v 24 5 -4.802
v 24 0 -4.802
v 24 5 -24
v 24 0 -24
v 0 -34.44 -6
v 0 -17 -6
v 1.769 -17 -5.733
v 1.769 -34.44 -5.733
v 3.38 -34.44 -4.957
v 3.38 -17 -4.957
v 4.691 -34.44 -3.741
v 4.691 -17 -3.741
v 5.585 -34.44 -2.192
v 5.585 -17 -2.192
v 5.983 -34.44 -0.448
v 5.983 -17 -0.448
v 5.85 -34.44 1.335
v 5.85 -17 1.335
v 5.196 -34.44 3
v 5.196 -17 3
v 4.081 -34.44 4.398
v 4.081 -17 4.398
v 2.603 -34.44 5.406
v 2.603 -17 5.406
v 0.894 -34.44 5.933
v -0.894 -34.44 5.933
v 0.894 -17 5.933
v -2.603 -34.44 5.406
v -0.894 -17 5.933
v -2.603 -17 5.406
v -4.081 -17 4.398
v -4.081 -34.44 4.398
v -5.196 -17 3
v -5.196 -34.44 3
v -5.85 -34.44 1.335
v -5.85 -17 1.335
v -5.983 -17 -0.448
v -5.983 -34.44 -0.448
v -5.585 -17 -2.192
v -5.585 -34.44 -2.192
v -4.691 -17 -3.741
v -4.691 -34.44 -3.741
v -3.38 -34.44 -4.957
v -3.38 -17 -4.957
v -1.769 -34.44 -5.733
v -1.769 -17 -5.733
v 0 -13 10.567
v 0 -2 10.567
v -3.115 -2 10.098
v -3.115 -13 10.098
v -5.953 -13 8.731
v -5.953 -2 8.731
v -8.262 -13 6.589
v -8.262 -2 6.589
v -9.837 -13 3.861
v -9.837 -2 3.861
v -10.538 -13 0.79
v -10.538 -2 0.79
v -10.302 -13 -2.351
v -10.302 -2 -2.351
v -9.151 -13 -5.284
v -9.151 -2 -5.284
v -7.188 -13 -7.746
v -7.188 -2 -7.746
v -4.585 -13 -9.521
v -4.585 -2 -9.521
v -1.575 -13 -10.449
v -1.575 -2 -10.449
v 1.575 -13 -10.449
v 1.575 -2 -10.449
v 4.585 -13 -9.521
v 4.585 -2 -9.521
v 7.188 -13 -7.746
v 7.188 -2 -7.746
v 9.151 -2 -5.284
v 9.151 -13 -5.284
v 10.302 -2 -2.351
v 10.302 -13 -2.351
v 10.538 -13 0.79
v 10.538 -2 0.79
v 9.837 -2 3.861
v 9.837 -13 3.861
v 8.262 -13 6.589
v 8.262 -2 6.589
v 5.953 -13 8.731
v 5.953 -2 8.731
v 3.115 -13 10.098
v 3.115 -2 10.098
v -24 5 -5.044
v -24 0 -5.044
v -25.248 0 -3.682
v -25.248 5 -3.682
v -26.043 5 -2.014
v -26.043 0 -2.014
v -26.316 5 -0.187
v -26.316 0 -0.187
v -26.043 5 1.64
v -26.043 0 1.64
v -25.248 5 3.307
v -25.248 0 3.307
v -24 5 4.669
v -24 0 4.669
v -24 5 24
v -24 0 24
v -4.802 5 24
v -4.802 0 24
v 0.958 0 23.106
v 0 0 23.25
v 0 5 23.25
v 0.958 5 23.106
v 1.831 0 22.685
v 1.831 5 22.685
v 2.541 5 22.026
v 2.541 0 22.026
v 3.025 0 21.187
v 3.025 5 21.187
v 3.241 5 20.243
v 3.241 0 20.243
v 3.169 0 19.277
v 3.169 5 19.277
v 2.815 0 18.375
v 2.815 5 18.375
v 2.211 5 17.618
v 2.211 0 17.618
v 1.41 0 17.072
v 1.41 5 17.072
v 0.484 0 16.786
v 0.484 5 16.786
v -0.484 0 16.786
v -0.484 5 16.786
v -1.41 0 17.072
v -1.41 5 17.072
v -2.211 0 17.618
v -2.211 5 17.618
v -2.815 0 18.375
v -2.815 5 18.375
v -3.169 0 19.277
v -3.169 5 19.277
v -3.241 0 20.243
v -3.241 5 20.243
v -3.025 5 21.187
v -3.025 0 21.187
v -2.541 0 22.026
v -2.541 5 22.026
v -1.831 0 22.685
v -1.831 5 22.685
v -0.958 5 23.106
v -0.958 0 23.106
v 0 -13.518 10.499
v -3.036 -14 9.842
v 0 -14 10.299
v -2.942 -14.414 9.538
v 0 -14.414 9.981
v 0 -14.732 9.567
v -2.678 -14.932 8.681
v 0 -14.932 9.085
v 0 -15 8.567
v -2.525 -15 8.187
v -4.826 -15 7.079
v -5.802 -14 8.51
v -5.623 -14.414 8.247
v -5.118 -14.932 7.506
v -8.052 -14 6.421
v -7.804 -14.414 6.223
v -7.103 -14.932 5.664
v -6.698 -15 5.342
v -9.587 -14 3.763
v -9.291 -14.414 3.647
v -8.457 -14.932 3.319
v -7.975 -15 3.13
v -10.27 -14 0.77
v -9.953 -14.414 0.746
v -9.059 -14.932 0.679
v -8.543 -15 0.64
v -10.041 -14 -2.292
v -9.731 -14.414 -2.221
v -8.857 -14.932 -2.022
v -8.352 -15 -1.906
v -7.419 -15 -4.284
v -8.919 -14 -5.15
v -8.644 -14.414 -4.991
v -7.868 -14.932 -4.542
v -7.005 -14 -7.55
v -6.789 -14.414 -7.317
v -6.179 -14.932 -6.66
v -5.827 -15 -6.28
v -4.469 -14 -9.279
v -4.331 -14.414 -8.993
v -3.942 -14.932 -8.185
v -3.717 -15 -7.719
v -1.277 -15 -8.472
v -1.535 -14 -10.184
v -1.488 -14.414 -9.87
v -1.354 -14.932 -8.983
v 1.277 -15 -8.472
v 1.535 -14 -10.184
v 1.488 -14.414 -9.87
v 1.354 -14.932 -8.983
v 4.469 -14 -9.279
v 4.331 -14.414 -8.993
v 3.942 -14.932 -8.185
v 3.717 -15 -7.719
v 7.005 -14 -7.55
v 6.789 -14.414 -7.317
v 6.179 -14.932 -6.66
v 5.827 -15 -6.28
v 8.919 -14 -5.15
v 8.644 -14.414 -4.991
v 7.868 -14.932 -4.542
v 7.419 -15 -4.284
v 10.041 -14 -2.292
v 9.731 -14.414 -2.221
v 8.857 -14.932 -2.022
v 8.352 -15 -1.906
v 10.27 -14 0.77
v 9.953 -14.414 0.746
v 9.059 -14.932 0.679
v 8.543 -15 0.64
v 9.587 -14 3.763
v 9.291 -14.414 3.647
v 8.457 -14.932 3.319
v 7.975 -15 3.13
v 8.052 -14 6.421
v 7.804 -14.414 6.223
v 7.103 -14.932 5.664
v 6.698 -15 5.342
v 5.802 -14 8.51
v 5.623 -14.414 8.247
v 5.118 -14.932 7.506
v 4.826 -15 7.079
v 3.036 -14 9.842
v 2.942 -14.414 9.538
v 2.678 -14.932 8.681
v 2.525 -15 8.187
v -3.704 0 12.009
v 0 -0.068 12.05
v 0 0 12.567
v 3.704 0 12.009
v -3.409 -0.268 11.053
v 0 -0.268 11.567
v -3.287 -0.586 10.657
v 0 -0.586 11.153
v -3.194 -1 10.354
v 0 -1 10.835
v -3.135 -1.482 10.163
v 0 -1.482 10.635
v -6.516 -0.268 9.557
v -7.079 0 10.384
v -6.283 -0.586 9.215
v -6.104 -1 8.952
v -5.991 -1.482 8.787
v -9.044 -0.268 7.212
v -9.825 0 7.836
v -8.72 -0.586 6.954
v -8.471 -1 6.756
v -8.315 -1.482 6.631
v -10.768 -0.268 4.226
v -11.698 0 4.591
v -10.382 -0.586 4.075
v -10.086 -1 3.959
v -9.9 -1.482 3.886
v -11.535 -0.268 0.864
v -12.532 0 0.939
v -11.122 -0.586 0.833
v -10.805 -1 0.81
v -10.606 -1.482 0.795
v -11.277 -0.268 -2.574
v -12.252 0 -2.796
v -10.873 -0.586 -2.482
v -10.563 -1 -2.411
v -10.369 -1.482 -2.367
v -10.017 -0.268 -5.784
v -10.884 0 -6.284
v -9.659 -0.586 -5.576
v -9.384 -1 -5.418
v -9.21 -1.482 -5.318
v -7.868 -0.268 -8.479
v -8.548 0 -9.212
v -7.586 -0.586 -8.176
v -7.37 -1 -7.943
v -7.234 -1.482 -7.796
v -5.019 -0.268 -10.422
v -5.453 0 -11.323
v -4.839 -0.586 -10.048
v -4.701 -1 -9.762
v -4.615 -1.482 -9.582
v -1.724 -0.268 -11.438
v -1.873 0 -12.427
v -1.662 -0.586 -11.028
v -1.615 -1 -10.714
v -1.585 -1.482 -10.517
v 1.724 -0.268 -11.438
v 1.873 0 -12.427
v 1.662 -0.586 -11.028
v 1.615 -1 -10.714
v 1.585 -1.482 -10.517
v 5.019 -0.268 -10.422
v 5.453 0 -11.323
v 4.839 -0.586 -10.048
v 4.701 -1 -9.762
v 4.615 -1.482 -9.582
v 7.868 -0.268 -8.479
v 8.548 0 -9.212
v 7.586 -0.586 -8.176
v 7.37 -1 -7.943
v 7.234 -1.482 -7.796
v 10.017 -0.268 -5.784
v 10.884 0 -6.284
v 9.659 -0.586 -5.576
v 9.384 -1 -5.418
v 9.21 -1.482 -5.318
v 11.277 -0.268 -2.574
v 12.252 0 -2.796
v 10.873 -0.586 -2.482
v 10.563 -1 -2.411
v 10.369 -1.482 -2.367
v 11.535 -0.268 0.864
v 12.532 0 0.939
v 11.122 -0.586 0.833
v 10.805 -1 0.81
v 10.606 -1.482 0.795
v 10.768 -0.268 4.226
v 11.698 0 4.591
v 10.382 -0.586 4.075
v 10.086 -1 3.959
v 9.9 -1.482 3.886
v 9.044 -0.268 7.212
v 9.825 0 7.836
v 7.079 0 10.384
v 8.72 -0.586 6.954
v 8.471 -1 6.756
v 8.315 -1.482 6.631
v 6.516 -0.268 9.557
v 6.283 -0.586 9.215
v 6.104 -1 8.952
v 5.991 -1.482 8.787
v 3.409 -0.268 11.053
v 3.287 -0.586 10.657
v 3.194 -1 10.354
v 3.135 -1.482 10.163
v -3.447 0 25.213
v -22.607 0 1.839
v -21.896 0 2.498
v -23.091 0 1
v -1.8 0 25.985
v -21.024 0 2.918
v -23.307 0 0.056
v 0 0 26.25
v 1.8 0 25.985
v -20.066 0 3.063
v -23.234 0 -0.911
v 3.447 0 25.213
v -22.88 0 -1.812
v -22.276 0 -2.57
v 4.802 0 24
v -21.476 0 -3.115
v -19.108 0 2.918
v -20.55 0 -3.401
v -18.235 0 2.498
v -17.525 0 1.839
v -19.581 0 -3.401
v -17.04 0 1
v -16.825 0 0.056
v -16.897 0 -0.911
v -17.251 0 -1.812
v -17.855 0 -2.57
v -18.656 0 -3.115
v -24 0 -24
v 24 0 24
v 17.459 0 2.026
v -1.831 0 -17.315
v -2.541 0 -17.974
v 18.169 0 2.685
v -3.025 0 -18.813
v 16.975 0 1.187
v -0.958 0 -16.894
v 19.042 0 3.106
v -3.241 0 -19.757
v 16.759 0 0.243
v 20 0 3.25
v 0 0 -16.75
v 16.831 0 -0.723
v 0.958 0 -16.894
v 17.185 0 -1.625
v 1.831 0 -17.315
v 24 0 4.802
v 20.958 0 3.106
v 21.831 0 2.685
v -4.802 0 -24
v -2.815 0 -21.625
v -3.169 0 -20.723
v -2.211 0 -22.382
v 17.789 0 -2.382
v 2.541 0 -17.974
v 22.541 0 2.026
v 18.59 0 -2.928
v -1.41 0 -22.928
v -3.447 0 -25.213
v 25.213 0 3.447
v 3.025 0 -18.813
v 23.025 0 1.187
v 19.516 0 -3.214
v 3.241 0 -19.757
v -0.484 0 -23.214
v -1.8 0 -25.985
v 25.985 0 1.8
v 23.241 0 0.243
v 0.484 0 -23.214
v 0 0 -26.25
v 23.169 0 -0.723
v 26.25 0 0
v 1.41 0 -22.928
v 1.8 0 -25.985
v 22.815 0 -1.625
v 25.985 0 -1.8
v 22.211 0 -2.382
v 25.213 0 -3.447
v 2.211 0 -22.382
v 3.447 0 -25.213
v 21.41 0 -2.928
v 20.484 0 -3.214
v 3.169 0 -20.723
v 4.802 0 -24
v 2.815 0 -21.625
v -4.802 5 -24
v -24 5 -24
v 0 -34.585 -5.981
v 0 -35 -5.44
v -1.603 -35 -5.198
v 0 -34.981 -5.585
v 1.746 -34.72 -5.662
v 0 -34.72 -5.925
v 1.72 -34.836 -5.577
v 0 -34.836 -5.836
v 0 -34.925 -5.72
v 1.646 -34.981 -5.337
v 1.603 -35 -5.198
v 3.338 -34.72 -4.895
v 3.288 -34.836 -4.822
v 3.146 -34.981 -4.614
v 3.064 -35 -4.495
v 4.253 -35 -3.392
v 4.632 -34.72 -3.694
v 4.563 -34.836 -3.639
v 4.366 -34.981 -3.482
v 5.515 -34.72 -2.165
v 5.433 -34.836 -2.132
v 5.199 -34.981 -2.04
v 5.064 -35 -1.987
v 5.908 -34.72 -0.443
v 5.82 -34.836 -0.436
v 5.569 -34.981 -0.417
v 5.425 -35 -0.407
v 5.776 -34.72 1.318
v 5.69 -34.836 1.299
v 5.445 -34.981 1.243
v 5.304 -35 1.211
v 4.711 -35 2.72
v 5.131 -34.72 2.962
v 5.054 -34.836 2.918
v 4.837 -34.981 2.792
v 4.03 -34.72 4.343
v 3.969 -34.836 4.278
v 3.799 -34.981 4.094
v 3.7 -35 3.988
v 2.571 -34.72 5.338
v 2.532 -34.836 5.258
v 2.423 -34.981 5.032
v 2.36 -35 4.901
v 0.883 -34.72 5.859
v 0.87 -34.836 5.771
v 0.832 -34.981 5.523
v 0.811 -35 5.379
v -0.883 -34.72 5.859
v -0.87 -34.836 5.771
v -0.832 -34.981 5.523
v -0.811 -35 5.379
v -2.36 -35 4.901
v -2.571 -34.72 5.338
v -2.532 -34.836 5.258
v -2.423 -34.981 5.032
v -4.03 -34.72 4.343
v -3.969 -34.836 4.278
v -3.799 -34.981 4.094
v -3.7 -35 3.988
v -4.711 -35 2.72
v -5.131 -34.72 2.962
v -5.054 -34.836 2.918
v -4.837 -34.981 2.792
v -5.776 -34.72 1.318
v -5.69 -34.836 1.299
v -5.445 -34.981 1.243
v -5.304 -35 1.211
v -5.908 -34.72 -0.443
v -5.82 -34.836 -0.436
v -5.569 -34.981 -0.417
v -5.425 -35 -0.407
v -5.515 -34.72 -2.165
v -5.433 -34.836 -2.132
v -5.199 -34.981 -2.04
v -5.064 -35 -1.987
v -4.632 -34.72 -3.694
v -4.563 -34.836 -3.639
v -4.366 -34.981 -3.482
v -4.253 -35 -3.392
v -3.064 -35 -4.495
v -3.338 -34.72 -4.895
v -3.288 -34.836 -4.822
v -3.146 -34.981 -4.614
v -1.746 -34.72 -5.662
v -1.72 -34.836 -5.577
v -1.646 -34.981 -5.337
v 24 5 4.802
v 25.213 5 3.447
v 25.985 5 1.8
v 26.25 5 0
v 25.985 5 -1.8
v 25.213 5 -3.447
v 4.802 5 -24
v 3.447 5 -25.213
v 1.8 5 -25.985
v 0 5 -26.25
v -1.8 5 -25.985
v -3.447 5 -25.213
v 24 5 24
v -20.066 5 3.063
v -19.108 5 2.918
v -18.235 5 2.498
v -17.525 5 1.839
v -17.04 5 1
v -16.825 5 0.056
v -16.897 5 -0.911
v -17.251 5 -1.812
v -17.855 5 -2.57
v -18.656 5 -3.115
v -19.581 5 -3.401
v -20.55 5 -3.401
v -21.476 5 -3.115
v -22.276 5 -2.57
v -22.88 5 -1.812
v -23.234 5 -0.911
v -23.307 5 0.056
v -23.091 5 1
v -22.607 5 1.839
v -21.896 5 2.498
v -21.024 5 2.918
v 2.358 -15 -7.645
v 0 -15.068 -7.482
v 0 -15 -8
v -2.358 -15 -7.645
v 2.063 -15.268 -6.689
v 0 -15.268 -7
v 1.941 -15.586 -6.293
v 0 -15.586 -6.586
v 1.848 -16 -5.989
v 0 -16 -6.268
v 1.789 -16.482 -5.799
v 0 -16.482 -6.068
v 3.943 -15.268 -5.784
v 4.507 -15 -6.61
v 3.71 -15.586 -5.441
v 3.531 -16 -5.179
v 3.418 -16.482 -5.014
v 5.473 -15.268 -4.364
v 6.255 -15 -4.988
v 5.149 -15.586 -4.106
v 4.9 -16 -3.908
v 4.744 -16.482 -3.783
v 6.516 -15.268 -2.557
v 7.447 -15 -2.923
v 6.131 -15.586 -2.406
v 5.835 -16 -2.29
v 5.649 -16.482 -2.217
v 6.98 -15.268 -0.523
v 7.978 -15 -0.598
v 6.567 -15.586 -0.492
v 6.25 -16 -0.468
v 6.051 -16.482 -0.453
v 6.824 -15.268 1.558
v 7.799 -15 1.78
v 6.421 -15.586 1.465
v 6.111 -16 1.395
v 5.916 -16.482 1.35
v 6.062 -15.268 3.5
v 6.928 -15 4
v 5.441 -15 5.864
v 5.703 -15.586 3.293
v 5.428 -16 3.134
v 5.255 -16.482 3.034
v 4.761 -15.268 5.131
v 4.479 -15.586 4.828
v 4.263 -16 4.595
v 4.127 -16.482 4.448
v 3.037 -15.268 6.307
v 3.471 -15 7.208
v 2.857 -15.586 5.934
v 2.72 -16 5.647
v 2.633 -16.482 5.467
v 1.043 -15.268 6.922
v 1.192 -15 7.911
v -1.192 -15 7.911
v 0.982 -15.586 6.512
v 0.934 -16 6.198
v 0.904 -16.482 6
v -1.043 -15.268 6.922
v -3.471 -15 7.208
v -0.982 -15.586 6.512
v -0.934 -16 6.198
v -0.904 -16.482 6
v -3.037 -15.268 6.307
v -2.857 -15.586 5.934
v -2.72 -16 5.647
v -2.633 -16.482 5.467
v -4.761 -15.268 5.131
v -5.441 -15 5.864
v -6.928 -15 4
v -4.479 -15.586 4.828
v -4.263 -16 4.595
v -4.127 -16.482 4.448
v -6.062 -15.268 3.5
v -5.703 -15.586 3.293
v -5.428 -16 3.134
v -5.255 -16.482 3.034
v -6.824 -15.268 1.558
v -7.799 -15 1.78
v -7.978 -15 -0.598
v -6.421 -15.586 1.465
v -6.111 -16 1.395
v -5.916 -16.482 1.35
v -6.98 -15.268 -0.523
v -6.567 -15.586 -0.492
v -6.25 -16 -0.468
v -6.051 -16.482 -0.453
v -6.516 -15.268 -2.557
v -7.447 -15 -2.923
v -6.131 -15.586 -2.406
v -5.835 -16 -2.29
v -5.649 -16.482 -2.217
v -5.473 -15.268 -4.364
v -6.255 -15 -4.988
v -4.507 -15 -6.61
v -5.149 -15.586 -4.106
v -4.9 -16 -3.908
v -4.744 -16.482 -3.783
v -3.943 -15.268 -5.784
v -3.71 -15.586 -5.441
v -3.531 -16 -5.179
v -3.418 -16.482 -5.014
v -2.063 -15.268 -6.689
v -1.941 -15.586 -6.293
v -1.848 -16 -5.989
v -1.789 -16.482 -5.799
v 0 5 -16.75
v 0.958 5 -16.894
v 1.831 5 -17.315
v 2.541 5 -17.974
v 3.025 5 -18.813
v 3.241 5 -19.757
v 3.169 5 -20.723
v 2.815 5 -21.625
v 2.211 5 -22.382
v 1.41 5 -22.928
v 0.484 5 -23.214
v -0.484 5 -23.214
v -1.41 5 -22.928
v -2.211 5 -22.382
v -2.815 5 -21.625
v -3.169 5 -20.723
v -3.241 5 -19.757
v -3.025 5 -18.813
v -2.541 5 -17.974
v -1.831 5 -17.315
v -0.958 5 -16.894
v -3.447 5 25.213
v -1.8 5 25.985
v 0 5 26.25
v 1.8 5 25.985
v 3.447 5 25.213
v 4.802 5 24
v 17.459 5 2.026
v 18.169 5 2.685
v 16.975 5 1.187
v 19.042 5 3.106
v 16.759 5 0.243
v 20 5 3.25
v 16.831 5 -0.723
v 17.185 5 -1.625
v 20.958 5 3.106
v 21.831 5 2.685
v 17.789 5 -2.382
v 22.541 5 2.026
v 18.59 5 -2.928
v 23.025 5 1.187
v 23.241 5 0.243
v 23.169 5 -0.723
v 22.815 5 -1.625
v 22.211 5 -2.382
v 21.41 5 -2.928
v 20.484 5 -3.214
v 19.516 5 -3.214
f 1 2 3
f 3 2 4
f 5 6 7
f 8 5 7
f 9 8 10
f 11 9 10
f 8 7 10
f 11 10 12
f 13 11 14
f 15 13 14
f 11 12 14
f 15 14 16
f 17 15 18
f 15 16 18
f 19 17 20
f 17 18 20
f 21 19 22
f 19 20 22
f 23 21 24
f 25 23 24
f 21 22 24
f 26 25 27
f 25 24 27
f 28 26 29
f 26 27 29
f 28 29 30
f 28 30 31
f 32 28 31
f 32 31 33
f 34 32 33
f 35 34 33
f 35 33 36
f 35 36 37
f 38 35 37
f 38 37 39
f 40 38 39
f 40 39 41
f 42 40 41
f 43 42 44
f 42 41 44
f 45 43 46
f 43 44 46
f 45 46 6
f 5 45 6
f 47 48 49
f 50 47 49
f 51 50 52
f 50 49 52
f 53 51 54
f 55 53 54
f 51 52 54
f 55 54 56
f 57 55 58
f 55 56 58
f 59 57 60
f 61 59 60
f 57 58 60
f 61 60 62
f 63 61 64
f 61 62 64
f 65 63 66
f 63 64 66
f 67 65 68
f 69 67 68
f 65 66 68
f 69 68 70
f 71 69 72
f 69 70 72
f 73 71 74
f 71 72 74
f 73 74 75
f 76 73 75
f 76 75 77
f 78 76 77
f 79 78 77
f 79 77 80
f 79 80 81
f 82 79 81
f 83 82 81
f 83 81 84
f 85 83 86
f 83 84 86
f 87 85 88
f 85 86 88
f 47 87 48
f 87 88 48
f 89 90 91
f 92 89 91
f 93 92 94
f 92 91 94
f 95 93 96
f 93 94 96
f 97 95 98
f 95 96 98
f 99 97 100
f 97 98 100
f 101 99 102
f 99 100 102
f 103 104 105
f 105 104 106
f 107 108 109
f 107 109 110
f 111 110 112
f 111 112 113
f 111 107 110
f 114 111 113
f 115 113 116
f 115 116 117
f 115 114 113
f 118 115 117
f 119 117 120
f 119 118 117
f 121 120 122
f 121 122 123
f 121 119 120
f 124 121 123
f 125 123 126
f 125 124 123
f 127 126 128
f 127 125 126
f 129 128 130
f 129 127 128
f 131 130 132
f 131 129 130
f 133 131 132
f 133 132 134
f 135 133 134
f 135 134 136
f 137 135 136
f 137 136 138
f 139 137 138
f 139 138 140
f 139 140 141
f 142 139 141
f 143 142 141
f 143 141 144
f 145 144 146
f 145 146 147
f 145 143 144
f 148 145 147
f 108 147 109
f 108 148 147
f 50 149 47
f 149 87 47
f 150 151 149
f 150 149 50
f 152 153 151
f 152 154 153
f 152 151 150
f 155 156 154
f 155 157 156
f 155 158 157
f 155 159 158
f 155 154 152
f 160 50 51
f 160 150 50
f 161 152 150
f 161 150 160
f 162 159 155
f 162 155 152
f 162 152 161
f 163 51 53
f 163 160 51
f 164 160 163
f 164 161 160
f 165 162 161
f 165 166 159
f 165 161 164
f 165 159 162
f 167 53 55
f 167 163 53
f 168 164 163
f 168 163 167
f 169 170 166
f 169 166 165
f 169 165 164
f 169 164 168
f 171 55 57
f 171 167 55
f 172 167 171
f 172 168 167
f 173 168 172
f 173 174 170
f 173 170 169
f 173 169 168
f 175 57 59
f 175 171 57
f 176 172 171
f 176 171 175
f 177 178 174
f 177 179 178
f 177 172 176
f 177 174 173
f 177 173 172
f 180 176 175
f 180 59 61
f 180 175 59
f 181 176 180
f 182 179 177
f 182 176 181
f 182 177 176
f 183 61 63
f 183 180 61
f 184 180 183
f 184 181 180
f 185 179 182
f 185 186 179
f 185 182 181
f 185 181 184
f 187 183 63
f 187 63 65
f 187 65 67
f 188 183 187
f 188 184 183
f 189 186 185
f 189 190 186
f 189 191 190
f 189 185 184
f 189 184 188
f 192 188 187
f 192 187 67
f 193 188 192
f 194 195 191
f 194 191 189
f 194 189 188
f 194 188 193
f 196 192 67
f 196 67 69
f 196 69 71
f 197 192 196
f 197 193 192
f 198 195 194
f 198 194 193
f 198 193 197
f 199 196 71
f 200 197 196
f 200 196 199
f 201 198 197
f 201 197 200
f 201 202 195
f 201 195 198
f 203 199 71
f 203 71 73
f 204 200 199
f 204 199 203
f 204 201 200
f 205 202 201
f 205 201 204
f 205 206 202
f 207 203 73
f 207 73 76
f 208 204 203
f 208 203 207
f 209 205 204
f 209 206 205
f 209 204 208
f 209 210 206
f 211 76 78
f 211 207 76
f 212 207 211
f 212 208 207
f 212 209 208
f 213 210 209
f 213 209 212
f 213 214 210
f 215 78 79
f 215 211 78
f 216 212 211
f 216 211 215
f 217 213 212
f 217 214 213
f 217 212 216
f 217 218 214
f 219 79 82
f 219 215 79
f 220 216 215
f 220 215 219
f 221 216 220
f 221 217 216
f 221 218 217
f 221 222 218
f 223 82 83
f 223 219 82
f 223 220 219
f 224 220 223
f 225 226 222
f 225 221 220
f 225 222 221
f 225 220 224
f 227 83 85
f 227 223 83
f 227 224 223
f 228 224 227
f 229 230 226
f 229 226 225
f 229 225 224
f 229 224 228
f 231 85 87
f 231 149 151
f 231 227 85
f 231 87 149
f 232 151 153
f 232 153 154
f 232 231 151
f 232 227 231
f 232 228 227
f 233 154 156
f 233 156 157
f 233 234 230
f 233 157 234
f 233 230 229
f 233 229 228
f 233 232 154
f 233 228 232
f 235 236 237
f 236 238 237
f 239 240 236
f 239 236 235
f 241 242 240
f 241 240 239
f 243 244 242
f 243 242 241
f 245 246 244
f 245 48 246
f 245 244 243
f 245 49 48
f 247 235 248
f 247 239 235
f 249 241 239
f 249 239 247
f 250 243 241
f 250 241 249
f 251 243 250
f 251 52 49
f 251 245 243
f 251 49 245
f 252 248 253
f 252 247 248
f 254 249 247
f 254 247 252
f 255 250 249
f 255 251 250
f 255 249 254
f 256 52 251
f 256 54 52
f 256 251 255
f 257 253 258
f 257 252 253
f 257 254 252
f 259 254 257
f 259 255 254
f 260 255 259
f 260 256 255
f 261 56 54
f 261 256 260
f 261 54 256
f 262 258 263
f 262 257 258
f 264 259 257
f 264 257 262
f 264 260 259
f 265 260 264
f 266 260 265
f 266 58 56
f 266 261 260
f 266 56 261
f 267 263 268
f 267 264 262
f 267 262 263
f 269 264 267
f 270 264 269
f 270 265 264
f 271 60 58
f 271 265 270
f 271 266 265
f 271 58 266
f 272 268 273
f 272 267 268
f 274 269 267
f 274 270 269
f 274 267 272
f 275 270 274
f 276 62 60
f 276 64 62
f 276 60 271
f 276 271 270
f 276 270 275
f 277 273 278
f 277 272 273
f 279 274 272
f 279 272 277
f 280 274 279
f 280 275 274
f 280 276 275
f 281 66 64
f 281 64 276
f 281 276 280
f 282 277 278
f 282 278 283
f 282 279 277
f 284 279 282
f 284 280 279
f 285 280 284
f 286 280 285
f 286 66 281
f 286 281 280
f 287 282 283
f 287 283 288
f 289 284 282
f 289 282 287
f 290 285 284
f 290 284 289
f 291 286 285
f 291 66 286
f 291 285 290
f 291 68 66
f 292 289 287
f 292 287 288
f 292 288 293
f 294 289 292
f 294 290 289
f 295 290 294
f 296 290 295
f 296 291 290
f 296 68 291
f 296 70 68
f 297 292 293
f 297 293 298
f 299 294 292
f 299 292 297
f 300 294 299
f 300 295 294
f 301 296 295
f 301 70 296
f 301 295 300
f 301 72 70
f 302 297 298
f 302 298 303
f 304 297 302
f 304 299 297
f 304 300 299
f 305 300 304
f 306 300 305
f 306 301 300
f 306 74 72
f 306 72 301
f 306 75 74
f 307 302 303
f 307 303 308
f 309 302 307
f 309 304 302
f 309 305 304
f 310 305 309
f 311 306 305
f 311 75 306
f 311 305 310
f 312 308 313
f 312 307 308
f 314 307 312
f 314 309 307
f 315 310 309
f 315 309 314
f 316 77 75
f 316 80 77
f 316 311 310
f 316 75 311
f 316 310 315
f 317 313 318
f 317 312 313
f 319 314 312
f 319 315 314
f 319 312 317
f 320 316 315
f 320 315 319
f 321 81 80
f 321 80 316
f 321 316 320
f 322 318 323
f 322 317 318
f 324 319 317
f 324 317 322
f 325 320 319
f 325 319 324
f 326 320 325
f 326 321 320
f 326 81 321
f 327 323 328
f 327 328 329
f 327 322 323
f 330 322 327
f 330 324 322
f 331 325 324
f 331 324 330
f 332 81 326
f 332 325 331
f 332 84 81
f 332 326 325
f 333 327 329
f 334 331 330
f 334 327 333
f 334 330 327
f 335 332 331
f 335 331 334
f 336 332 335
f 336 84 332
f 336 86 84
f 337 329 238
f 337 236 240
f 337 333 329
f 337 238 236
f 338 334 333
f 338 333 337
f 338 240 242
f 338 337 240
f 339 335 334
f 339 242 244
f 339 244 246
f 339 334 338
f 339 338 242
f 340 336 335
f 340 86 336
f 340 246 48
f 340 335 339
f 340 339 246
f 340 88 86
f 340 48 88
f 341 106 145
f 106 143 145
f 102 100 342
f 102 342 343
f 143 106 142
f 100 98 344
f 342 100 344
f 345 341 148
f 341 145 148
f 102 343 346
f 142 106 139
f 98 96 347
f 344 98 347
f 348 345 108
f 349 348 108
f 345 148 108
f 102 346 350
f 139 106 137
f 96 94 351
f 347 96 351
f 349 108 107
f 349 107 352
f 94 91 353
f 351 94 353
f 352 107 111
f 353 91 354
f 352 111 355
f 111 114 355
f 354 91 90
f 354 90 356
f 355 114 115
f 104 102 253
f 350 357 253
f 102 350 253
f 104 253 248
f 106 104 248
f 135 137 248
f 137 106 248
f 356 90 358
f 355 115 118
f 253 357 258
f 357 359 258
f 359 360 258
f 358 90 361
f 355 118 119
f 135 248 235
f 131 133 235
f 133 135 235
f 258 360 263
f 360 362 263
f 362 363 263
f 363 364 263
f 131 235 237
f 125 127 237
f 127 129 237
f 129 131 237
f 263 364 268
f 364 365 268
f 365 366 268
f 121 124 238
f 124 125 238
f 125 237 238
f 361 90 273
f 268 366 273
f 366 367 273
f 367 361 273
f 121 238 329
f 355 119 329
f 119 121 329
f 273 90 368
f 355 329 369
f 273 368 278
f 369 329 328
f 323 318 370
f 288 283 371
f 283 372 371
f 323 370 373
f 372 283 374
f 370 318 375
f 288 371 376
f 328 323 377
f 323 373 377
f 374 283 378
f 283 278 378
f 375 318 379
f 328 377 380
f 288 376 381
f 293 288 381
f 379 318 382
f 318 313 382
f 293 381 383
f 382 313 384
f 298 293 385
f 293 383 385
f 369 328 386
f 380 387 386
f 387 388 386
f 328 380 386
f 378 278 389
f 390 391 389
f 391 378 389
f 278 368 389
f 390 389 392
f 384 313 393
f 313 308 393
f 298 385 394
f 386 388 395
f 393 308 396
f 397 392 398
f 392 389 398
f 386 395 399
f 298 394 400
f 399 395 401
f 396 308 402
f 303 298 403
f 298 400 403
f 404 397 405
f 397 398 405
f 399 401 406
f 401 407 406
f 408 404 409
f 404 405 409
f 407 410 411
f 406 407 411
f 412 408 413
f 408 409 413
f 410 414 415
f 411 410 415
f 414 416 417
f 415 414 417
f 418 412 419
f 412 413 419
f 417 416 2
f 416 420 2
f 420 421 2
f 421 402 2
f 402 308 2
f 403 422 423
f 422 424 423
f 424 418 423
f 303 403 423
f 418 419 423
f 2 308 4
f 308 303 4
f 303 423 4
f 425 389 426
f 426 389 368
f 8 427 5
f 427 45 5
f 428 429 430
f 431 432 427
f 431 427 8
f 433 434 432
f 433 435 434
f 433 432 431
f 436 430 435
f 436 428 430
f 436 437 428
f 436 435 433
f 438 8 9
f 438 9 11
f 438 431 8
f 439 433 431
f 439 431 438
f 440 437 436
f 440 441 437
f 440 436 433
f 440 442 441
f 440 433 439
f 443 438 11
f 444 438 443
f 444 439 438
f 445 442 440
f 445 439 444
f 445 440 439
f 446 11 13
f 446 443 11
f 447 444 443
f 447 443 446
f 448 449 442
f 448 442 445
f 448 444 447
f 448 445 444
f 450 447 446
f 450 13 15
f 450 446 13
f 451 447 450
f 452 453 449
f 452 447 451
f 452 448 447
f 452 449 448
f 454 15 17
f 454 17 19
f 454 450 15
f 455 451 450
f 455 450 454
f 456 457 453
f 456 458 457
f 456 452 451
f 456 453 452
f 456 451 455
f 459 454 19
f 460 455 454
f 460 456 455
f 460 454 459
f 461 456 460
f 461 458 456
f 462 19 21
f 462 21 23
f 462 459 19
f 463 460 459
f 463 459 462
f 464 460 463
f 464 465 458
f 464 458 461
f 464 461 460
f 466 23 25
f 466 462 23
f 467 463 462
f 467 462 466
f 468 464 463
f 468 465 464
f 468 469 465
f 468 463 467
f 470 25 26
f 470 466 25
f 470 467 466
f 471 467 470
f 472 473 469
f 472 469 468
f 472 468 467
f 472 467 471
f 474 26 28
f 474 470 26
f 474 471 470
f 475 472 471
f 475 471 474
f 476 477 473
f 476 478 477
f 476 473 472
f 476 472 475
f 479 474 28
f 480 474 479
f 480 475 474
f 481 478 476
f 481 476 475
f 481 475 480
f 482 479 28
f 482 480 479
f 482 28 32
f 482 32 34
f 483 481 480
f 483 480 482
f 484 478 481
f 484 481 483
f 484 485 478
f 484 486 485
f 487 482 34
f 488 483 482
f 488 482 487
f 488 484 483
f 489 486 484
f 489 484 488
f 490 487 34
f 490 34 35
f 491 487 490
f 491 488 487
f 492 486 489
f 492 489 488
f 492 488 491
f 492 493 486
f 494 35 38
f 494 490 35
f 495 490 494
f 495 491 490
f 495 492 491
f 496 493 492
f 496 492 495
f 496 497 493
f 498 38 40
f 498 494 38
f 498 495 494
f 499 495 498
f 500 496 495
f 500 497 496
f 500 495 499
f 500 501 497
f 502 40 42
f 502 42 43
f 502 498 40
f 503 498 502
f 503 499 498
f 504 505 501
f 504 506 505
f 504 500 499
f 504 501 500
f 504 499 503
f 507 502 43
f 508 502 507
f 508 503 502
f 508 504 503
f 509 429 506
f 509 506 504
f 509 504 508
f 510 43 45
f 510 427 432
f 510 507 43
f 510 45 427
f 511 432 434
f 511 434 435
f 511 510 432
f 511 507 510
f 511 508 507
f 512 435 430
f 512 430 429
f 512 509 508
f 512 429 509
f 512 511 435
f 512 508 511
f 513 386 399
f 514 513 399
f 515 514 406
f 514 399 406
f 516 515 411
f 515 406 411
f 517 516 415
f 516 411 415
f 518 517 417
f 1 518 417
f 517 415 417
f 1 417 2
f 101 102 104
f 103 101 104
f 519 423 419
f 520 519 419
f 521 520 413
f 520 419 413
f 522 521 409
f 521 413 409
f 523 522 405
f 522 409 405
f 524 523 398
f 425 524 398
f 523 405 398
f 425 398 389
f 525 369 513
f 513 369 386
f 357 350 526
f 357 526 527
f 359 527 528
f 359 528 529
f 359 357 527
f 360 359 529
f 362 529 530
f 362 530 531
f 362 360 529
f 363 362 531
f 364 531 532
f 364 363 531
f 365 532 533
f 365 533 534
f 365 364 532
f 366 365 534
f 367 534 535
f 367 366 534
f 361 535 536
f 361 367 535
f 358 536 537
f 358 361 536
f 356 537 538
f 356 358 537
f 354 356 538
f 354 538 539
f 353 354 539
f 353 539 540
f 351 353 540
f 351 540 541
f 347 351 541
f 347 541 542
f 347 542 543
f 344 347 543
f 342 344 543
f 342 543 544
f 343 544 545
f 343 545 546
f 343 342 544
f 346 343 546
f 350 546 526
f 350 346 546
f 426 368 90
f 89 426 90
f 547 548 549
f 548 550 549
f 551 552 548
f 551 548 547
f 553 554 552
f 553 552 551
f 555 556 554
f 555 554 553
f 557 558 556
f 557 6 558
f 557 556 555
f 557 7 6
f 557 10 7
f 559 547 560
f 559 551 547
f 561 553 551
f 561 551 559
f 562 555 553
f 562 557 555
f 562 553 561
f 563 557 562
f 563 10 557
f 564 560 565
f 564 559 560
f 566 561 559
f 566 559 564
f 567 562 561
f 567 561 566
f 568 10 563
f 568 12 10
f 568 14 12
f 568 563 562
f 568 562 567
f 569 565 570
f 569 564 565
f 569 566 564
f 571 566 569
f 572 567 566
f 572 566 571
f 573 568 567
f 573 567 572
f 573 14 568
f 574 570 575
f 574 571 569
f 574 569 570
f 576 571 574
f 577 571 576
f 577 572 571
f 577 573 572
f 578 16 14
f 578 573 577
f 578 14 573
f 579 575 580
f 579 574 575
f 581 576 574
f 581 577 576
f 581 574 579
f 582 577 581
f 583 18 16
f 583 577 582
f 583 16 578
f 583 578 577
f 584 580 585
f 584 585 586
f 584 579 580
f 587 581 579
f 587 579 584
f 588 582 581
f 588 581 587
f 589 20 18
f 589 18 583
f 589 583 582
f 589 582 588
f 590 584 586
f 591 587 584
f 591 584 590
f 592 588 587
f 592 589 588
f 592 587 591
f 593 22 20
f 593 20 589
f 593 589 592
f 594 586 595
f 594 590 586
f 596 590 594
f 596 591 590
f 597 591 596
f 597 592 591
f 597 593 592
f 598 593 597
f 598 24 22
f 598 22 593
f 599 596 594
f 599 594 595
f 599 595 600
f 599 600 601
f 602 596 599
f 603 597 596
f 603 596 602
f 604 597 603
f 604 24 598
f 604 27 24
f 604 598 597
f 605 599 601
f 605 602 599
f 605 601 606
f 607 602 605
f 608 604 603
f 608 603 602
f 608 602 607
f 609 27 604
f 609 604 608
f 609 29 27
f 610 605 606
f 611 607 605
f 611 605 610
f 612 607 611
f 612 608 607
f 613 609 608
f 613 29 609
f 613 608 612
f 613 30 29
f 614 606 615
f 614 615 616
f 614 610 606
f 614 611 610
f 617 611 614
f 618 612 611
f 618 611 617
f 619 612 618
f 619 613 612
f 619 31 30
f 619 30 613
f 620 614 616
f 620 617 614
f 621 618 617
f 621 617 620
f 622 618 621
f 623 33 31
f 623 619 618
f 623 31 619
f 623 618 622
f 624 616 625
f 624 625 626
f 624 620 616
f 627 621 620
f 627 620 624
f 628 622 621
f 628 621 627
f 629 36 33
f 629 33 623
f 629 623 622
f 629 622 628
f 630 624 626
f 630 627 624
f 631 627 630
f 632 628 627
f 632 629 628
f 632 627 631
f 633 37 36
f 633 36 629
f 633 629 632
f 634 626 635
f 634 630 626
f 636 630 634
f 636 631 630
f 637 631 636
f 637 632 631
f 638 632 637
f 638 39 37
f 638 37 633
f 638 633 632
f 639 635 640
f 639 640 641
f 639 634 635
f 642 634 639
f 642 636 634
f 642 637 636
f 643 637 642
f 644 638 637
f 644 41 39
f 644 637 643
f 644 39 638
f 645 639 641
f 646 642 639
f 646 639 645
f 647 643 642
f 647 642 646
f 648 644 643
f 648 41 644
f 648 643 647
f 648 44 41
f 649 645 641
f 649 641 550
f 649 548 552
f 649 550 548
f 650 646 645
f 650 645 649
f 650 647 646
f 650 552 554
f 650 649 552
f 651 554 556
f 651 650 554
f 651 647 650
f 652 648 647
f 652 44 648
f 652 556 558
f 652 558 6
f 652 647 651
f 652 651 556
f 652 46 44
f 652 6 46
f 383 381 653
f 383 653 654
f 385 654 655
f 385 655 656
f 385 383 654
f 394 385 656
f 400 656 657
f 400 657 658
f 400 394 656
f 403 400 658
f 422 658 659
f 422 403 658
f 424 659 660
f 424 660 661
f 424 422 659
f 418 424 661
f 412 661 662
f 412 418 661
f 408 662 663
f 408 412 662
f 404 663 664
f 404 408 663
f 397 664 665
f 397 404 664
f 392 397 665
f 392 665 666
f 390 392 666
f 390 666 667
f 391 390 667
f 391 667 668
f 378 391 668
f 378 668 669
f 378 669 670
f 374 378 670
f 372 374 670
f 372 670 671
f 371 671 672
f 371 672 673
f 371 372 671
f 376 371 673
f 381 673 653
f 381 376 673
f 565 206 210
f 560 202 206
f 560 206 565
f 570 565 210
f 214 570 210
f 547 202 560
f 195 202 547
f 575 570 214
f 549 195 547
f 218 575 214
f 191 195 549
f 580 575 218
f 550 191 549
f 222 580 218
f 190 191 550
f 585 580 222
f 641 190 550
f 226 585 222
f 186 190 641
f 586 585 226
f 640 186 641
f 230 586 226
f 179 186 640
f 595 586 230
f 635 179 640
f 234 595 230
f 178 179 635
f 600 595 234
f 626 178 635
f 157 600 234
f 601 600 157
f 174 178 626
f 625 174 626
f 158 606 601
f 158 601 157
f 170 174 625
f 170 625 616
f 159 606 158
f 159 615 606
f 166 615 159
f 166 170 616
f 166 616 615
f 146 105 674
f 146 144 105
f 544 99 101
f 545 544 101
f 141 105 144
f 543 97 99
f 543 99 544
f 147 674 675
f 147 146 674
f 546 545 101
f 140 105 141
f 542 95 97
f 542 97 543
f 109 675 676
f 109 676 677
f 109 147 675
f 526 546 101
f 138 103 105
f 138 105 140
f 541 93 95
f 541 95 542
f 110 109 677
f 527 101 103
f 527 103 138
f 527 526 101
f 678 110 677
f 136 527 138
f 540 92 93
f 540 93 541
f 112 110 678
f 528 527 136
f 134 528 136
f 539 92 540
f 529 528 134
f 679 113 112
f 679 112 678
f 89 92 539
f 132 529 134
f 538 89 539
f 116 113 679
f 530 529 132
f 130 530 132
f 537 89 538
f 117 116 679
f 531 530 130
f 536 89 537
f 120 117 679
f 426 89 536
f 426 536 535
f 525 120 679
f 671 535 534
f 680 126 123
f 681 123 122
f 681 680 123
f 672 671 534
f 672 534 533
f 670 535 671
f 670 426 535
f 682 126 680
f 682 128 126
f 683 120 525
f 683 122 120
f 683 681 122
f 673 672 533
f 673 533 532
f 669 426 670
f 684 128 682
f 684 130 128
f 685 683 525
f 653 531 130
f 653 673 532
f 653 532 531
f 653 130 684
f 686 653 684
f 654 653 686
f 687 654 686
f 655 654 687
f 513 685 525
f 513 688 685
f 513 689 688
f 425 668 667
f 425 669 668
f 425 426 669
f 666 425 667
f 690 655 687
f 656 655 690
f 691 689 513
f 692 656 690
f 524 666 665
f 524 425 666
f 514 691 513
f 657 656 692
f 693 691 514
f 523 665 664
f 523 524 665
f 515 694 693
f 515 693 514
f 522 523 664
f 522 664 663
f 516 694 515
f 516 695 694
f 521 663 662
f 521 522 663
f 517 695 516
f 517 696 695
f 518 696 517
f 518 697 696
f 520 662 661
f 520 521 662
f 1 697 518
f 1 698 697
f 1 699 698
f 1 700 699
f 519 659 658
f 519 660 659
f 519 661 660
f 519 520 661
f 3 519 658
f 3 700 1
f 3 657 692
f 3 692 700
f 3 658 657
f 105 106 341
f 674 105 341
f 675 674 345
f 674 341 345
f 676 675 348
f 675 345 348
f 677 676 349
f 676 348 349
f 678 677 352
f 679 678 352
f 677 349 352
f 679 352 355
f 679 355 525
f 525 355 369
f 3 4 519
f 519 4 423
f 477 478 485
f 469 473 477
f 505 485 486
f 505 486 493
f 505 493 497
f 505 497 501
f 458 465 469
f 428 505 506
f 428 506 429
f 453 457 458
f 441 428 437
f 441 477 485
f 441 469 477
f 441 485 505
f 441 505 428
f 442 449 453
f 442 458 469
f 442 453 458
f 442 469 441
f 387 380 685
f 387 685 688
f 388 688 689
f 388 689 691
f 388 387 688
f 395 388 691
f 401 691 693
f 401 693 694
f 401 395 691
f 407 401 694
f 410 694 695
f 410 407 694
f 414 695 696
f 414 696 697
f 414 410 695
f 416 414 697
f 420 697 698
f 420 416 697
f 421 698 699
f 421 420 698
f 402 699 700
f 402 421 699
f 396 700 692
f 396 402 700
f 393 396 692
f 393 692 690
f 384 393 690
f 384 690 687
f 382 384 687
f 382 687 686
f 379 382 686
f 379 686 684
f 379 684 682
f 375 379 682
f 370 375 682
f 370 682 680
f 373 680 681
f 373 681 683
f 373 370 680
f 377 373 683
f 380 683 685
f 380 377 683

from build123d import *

# Parameters (mm, degrees)
SKETCH1_R           = 3.25
BOSS_EXTRUDE1_DEPTH = 5
SKETCH2_W           = 32.64938716
SKETCH2_H           = 32.90693226
BOSS_EXTRUDE2_DEPTH = 5
SKETCH3_R           = 10.567193536
BOSS_EXTRUDE3_DEPTH = 15
SKETCH4_R           = 6
BOSS_EXTRUDE4_DEPTH = 20
FILLET1_R           = 2
FILLET2_R           = 0.56


with BuildPart() as part:
    # Sketch1 → Boss-Extrude1 (new body)
    with BuildSketch(Plane(origin=(0, 0, 0), x_dir=(1, 0, 0), z_dir=(0, 1, 0))):
        with BuildLine():
            Line((-24, -4.668943148), (-24, -24))
            Line((-24, -24), (-4.802343178, -24))
            ThreePointArc((-4.802343178, -24), (0, -26.25), (4.802343178, -24))
            Line((4.802343178, -24), (24, -24))
            Line((24, -24), (24, -4.802343178))
            ThreePointArc((24, -4.802343178), (26.25, 0), (24, 4.802343178))
            Line((24, 4.802343178), (24, 24))
            Line((24, 24), (4.802343178, 24))
            ThreePointArc((4.802343178, 24), (0, 26.25), (-4.802343178, 24))
            Line((-4.802343178, 24), (-24, 24))
            Line((-24, 24), (-24, 5.04363247))
            ThreePointArc((-24, 5.04363247), (-26.315667945, 0.187344661), (-24, -4.668943148))
        make_face()
        with Locations(Location((-20.065667945, 0.187344661, 0), (0, 0, 270))):
            Circle(SKETCH1_R, mode=Mode.SUBTRACT)
        with Locations(Location((0, 20, 0), (0, 0, 270))):
            Circle(SKETCH1_R, mode=Mode.SUBTRACT)
        with Locations(Location((20, 0, 0), (0, 0, 270))):
            Circle(SKETCH1_R, mode=Mode.SUBTRACT)
        with Locations(Location((0, -20, 0), (0, 0, 270))):
            Circle(SKETCH1_R, mode=Mode.SUBTRACT)
        with BuildLine():
            Line((-16, 16), (-4.802343178, 16))
            ThreePointArc((-4.802343178, 16), (0, 13.75), (4.802343178, 16))
            Line((4.802343178, 16), (16, 16))
            Line((16, 16), (16, 4.802343178))
            ThreePointArc((16, 4.802343178), (13.75, 0), (16, -4.802343178))
            Line((16, -4.802343178), (16, -16))
            Line((16, -16), (4.802343178, -16))
            ThreePointArc((4.802343178, -16), (0, -13.75), (-4.802343178, -16))
            Line((-4.802343178, -16), (-16, -16))
            Line((-16, -16), (-16, -4.559532645))
            ThreePointArc((-16, -4.559532645), (-13.815667945, 0.187344661), (-16, 4.934221967))
            Line((-16, 4.934221967), (-16, 16))
        make_face(mode=Mode.SUBTRACT)
    extrude(amount=BOSS_EXTRUDE1_DEPTH)

    # Sketch2 → Boss-Extrude2 (add)
    with BuildSketch(Plane.XZ):
        Rectangle(SKETCH2_W, SKETCH2_H)
    extrude(amount=-BOSS_EXTRUDE2_DEPTH)

    # Sketch3 → Boss-Extrude3 (add)
    with BuildSketch(Plane(origin=(0, 0, 0), x_dir=(-1, 0, 0), z_dir=(0, -1, 0))):
        with Locations(Location((0, 0, 0), (0, 0, 270))):
            Circle(SKETCH3_R)
    extrude(amount=BOSS_EXTRUDE3_DEPTH)

    # Sketch4 → Boss-Extrude4 (add)
    with BuildSketch(Plane(origin=(0, -15, 0), x_dir=(-1, 0, 0), z_dir=(0, -1, 0))):
        with Locations(Location((0, 0, 0), (0, 0, 90))):
            Circle(SKETCH4_R)
    extrude(amount=BOSS_EXTRUDE4_DEPTH)

    # Fillet1
    fillet1_edges = [part.edges().sort_by_distance(p)[0] for p in [
        (0, 0, -10.567193536),
        (0, -15, -10.567193536),
        (0, -15, 6),
    ]]
    fillet(fillet1_edges, radius=FILLET1_R)

    # Fillet2
    fillet2_edges = [part.edges().sort_by_distance(p)[0] for p in [
        (0, -35, 6),
    ]]
    fillet(fillet2_edges, radius=FILLET2_R)


solid = part.part
